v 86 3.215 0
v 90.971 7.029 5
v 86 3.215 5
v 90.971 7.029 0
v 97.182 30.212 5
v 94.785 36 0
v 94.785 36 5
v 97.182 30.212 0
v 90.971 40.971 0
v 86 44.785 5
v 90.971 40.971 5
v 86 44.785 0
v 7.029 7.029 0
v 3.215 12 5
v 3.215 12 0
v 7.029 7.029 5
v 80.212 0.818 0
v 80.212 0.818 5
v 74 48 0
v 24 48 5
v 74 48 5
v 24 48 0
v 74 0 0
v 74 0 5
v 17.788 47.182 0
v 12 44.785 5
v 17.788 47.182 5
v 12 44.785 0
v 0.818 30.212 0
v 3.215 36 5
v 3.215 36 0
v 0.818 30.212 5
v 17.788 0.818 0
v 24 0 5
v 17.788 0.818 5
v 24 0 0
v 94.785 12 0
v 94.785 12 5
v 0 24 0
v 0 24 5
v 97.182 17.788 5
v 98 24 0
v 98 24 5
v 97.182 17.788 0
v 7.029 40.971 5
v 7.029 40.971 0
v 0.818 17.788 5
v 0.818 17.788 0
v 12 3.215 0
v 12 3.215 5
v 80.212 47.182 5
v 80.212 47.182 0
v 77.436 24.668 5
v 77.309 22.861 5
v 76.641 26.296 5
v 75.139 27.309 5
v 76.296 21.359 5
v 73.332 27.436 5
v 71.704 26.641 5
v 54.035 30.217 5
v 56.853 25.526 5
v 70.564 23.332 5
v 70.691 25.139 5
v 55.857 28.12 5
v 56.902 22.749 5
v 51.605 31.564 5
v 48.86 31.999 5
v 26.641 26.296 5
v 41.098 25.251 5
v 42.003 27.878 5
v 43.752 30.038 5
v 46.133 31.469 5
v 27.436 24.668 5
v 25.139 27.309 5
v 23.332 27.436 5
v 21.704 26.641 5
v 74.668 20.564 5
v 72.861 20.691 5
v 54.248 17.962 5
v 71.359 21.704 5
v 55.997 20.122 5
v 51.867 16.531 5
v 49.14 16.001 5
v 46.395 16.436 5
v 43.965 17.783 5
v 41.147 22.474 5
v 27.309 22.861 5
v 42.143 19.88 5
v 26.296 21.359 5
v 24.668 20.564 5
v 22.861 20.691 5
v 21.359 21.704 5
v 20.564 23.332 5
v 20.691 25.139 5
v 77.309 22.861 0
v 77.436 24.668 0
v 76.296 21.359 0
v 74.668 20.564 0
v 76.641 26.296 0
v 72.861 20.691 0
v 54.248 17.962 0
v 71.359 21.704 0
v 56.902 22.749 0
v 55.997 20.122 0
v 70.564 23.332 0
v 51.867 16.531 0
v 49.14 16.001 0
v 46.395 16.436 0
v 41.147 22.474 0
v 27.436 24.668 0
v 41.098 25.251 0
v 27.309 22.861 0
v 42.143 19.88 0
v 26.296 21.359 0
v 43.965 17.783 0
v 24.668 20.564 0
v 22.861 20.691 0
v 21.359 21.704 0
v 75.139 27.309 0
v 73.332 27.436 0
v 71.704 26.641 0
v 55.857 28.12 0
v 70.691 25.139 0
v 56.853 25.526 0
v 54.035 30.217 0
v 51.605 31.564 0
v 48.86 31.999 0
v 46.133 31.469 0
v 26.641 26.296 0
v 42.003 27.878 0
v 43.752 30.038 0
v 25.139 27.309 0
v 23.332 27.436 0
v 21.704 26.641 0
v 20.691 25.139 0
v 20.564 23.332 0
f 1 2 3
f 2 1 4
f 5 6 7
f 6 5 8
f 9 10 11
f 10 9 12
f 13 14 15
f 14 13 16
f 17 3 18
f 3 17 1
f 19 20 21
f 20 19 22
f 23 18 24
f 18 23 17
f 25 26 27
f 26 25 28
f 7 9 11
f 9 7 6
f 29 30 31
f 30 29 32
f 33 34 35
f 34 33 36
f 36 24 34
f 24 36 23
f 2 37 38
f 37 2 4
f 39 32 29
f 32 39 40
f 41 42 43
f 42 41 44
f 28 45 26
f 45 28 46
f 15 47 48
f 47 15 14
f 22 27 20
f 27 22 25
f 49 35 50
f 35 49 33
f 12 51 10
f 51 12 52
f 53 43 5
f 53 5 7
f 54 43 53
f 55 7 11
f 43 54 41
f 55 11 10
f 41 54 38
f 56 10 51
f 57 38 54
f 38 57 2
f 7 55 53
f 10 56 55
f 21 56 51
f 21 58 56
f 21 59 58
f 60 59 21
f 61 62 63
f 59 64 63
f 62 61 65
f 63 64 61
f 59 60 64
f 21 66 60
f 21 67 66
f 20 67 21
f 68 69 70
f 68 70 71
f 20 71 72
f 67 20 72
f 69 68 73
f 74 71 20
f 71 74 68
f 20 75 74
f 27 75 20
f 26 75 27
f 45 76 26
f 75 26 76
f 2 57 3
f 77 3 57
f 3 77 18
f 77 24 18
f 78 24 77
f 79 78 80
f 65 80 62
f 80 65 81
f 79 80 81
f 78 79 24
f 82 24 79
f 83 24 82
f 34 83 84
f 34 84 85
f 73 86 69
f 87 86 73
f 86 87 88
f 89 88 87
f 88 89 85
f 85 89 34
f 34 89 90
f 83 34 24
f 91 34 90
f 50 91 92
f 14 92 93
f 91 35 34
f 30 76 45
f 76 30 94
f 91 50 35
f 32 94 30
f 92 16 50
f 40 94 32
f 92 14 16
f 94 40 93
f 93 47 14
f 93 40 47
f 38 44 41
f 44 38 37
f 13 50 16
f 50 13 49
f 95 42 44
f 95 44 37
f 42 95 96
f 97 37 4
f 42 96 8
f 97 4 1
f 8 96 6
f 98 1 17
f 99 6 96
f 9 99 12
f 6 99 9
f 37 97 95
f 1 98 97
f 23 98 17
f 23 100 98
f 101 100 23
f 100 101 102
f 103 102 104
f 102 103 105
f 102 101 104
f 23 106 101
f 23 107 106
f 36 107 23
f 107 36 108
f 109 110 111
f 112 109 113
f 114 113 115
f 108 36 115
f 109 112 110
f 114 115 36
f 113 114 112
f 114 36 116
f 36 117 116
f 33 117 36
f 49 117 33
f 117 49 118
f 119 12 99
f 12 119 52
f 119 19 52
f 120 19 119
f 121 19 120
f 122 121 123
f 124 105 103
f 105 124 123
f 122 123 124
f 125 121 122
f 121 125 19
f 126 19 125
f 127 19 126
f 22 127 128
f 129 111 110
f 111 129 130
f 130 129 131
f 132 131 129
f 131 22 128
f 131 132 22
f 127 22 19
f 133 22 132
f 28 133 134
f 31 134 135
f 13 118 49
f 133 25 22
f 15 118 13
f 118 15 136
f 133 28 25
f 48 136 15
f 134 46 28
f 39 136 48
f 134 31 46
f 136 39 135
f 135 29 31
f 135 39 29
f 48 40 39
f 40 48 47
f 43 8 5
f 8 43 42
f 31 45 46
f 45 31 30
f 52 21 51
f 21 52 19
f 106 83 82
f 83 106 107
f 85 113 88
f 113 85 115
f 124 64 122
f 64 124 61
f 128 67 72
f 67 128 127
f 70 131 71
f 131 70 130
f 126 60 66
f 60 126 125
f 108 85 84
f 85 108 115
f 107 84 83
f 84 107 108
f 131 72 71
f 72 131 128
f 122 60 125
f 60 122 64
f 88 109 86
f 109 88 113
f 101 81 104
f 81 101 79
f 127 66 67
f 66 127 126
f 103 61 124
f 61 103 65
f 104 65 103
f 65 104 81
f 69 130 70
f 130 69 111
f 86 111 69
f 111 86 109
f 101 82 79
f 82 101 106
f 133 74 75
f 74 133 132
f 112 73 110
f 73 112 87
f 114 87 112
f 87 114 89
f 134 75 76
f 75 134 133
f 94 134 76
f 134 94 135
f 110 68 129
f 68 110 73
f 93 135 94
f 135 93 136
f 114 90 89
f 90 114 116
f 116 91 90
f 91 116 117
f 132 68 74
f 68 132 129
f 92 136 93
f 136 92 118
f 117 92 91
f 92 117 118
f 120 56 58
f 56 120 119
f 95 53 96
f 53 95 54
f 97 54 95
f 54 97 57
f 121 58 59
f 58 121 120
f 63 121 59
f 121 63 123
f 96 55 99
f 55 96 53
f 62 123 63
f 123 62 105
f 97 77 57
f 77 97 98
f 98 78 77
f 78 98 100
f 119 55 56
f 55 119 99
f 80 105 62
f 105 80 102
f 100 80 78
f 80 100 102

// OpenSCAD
$fn = 32;

// ----------------------------------------------------------------------
// Spacer plate: obround span 50, caps R24
// ----------------------------------------------------------------------

// --- parameters (mm) ---
bore_r = 8;               // centre bore radius
bolt_r = 3.5;             // bolt hole radius
plate_t = 5;              // plate thickness, Z (extrusion height)
span = 50;                // obround span
cap_r = 24;               // cap radius

profile = [[24, 48], [17.788, 47.182], [12, 44.785], [7.029, 40.971], [3.215, 36], [0.818, 30.212], [0, 24], [0.818, 17.788], [3.215, 12], [7.029, 7.029], [12, 3.215], [17.788, 0.818], [24, 0], [74, 0], [80.212, 0.818], [86, 3.215], [90.971, 7.029], [94.785, 12], [97.182, 17.788], [98, 24], [97.182, 30.212], [94.785, 36], [90.971, 40.971], [86, 44.785], [80.212, 47.182], [74, 48]];  // primary outline, 26 points, counter clockwise
void_1 = [[56.853, 25.526], [55.857, 28.12], [54.035, 30.217], [51.605, 31.564], [48.86, 31.999], [46.133, 31.469], [43.752, 30.038], [42.003, 27.878], [41.098, 25.251], [41.147, 22.474], [42.143, 19.88], [43.965, 17.783], [46.395, 16.436], [49.14, 16.001], [51.867, 16.531], [54.248, 17.962], [55.997, 20.122], [56.902, 22.749]];  // centre bore, 18 points
void_2 = [[27.436, 24.668], [26.641, 26.296], [25.139, 27.309], [23.332, 27.436], [21.704, 26.641], [20.691, 25.139], [20.564, 23.332], [21.359, 21.704], [22.861, 20.691], [24.668, 20.564], [26.296, 21.359], [27.309, 22.861]];  // end hole, 12 points
void_3 = [[77.436, 24.668], [76.641, 26.296], [75.139, 27.309], [73.332, 27.436], [71.704, 26.641], [70.691, 25.139], [70.564, 23.332], [71.359, 21.704], [72.861, 20.691], [74.668, 20.564], [76.296, 21.359], [77.309, 22.861]];  // end hole, 12 points

// --- the one profile operation ---
difference() {
  linear_extrude(height = plate_t) polygon(points = profile);
  translate([0, 0, -1])
    linear_extrude(height = plate_t + 2) polygon(points = void_1);
  translate([0, 0, -1])
    linear_extrude(height = plate_t + 2) polygon(points = void_2);
  translate([0, 0, -1])
    linear_extrude(height = plate_t + 2) polygon(points = void_3);
}
